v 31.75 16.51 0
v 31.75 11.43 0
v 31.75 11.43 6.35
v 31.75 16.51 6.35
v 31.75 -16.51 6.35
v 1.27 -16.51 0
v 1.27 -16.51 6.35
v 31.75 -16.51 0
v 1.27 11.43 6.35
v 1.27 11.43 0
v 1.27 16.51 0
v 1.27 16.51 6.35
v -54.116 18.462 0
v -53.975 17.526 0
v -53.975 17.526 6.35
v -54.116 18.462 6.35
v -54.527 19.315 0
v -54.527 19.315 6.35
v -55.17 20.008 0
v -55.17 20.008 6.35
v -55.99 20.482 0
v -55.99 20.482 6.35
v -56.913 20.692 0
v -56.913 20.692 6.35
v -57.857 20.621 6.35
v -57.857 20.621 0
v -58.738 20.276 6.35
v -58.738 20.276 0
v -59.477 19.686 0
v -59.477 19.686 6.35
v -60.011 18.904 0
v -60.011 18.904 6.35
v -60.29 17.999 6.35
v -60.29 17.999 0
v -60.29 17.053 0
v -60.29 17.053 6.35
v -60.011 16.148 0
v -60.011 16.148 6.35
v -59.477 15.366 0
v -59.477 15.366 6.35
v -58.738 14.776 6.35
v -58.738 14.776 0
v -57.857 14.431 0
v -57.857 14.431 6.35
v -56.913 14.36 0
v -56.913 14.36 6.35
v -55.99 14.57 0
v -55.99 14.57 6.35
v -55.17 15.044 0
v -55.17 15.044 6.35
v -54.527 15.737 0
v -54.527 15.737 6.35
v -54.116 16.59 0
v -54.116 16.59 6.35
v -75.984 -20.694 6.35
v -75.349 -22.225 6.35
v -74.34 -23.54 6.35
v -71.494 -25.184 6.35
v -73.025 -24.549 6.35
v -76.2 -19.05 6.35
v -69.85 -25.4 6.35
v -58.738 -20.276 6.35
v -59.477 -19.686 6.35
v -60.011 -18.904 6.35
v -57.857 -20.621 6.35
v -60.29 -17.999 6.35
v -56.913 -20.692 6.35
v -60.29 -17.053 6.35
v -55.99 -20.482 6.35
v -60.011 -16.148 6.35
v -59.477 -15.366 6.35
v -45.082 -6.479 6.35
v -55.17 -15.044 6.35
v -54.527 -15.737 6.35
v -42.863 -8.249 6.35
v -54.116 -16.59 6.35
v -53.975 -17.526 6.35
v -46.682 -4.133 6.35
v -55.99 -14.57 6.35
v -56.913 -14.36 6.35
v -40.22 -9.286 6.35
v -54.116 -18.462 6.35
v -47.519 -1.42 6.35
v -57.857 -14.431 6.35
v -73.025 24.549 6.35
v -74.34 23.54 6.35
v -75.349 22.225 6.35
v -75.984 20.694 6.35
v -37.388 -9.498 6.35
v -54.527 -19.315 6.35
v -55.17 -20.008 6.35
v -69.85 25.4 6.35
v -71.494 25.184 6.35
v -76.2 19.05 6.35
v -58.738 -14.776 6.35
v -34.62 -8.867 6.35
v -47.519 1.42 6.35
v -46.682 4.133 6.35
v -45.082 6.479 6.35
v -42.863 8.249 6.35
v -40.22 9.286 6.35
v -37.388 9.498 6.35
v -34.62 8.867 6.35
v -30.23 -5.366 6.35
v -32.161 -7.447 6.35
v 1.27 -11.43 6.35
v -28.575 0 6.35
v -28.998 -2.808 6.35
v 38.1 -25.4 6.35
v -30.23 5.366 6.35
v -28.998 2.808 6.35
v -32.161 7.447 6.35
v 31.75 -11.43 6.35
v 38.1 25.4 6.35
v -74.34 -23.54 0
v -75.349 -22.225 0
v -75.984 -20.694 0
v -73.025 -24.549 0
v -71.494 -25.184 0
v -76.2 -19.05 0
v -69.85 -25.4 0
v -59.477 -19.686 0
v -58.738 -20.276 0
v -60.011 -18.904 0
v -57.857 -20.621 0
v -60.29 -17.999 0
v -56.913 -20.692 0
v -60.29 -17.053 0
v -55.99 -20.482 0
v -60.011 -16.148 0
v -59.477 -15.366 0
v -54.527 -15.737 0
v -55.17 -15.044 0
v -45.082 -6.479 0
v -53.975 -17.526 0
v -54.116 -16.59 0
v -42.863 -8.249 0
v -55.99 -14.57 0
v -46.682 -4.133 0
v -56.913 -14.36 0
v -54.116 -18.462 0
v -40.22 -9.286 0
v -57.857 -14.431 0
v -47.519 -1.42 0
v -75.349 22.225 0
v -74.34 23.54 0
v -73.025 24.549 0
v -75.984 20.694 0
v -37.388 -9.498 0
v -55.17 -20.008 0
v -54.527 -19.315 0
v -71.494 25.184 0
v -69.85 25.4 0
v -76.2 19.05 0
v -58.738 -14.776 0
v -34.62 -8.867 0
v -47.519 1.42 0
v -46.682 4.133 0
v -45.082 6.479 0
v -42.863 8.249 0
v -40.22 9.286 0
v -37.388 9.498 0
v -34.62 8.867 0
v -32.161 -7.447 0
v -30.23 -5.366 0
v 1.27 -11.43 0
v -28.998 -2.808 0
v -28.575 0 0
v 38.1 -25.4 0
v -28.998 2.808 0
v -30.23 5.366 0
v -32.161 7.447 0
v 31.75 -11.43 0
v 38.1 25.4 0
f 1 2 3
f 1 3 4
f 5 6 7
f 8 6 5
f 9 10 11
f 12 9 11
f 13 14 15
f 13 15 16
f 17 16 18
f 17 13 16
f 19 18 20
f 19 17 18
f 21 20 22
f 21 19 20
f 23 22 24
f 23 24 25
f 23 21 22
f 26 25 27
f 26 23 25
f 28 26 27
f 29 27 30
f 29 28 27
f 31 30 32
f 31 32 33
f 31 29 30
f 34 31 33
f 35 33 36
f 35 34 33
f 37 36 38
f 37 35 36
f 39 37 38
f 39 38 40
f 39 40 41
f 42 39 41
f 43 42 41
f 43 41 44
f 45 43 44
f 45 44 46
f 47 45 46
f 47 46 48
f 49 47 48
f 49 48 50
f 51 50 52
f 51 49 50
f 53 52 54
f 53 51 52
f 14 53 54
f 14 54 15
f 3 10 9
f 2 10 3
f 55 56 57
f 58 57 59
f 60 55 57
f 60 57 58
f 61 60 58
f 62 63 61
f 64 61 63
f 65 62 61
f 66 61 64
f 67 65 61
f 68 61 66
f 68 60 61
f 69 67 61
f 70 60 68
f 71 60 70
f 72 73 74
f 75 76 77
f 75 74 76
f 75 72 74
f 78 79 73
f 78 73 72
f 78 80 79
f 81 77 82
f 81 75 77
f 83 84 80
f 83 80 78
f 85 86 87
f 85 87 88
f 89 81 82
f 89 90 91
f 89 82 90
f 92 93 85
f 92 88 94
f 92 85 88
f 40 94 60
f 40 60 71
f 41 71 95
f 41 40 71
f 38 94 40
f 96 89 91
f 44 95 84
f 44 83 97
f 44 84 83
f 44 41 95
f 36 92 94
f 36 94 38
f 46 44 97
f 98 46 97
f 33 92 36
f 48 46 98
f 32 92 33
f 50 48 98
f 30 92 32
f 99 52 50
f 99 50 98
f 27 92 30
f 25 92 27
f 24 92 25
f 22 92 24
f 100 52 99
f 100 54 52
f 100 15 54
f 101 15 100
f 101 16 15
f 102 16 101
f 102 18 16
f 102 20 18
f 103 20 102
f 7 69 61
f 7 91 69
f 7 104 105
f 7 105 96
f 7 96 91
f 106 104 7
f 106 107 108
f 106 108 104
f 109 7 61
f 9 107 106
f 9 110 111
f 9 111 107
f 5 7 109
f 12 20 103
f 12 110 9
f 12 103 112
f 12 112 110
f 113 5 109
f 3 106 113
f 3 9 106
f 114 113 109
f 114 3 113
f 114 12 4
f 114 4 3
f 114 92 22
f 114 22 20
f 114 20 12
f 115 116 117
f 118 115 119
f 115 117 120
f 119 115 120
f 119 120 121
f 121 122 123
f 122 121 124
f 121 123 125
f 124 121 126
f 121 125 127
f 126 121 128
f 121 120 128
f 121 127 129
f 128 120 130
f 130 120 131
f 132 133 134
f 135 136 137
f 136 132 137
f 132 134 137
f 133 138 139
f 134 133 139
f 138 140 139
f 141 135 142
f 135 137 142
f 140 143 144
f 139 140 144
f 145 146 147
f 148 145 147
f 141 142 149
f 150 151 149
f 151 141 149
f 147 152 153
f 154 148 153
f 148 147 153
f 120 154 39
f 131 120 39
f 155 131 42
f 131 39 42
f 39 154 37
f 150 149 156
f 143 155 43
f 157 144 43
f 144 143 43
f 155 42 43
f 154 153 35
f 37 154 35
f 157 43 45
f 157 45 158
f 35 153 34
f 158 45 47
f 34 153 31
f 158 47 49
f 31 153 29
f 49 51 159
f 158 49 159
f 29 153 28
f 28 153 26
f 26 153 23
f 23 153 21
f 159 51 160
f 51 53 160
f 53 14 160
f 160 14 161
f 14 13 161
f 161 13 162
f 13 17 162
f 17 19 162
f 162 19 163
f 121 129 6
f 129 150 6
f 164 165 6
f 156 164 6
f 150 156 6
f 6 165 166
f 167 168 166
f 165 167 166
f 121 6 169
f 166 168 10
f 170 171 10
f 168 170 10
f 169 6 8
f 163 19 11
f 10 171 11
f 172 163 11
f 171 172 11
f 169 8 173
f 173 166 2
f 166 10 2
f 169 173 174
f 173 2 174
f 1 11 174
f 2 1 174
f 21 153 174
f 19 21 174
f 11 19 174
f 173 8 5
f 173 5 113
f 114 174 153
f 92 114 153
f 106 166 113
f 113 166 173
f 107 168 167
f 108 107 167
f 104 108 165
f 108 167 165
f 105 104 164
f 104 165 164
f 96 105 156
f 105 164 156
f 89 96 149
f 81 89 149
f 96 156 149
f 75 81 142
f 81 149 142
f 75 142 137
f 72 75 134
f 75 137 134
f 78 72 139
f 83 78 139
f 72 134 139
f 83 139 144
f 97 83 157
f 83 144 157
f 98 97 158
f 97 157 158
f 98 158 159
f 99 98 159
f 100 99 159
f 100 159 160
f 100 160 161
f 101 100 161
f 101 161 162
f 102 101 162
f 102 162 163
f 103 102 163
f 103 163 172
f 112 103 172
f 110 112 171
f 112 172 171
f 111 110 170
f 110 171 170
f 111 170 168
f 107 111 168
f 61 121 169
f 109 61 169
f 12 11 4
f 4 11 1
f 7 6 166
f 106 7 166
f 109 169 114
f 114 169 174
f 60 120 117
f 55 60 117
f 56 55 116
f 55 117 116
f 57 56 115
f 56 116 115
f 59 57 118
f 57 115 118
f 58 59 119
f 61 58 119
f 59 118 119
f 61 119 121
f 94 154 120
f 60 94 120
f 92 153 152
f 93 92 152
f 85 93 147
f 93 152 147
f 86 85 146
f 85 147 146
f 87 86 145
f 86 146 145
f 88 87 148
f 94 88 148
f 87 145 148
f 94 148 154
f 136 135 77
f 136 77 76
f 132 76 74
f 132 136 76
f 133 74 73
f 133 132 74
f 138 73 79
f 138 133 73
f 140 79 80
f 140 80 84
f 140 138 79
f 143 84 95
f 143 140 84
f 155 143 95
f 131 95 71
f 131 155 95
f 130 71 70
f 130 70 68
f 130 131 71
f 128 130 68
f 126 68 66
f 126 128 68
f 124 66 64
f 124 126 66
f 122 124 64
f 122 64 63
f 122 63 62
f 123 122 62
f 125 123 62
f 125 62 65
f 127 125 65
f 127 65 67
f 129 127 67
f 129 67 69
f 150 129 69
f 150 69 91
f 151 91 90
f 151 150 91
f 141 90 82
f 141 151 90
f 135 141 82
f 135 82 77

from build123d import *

# Parameters (mm, degrees)
F0_W     = 30.48
F0_H     = 5.08
F0_R     = 3.175
F1_DEPTH = 6.35
F2_DEPTH = 6.35


with BuildPart() as f1:
    # F0 (on Top) → F1 (new body)
    with BuildSketch(Plane.XY):
        with BuildLine():
            Line((38.1, -25.4), (38.1, 25.4))
            Line((38.1, 25.4), (-38.1, 25.4))
            Line((-38.1, 25.4), (-38.1, 9.525))
            ThreePointArc((-38.1, 9.525), (-31.3648079092, 6.7351920908), (-28.575, 0))
            ThreePointArc((-28.575, 0), (-31.3648079092, -6.7351920908), (-38.1, -9.525))
            Line((-38.1, -9.525), (-38.1, -25.4))
            Line((-38.1, -25.4), (38.1, -25.4))
        make_face()
        with Locations((16.51, -13.97)):
            Rectangle(F0_W, F0_H, mode=Mode.SUBTRACT)
        with Locations((16.51, 13.97)):
            Rectangle(F0_W, F0_H, mode=Mode.SUBTRACT)
        with BuildLine():
            Line((-38.1, 9.525), (-38.1, 25.4))
            Line((-38.1, 25.4), (-69.85, 25.4))
            ThreePointArc((-69.85, 25.4), (-74.3401280605, 23.5401280605), (-76.2, 19.05))
            Line((-76.2, 19.05), (-76.2, -19.05))
            ThreePointArc((-76.2, -19.05), (-74.3401280605, -23.5401280605), (-69.85, -25.4))
            Line((-69.85, -25.4), (-38.1, -25.4))
            Line((-38.1, -25.4), (-38.1, -9.525))
            ThreePointArc((-38.1, -9.525), (-47.625, 0), (-38.1, 9.525))
        make_face()
        with Locations((-57.15, -17.526)):
            Circle(F0_R, mode=Mode.SUBTRACT)
        with Locations((-57.15, 17.526)):
            Circle(F0_R, mode=Mode.SUBTRACT)
    extrude(amount=F1_DEPTH)

    # F2 (add): a face of the model
    f2_faces = [f1.faces().sort_by_distance(p)[0] for p in [
        (-19.4796748363, 0, 6.35),
    ]]
    extrude(f2_faces, amount=-F2_DEPTH)


solid = f1.part
